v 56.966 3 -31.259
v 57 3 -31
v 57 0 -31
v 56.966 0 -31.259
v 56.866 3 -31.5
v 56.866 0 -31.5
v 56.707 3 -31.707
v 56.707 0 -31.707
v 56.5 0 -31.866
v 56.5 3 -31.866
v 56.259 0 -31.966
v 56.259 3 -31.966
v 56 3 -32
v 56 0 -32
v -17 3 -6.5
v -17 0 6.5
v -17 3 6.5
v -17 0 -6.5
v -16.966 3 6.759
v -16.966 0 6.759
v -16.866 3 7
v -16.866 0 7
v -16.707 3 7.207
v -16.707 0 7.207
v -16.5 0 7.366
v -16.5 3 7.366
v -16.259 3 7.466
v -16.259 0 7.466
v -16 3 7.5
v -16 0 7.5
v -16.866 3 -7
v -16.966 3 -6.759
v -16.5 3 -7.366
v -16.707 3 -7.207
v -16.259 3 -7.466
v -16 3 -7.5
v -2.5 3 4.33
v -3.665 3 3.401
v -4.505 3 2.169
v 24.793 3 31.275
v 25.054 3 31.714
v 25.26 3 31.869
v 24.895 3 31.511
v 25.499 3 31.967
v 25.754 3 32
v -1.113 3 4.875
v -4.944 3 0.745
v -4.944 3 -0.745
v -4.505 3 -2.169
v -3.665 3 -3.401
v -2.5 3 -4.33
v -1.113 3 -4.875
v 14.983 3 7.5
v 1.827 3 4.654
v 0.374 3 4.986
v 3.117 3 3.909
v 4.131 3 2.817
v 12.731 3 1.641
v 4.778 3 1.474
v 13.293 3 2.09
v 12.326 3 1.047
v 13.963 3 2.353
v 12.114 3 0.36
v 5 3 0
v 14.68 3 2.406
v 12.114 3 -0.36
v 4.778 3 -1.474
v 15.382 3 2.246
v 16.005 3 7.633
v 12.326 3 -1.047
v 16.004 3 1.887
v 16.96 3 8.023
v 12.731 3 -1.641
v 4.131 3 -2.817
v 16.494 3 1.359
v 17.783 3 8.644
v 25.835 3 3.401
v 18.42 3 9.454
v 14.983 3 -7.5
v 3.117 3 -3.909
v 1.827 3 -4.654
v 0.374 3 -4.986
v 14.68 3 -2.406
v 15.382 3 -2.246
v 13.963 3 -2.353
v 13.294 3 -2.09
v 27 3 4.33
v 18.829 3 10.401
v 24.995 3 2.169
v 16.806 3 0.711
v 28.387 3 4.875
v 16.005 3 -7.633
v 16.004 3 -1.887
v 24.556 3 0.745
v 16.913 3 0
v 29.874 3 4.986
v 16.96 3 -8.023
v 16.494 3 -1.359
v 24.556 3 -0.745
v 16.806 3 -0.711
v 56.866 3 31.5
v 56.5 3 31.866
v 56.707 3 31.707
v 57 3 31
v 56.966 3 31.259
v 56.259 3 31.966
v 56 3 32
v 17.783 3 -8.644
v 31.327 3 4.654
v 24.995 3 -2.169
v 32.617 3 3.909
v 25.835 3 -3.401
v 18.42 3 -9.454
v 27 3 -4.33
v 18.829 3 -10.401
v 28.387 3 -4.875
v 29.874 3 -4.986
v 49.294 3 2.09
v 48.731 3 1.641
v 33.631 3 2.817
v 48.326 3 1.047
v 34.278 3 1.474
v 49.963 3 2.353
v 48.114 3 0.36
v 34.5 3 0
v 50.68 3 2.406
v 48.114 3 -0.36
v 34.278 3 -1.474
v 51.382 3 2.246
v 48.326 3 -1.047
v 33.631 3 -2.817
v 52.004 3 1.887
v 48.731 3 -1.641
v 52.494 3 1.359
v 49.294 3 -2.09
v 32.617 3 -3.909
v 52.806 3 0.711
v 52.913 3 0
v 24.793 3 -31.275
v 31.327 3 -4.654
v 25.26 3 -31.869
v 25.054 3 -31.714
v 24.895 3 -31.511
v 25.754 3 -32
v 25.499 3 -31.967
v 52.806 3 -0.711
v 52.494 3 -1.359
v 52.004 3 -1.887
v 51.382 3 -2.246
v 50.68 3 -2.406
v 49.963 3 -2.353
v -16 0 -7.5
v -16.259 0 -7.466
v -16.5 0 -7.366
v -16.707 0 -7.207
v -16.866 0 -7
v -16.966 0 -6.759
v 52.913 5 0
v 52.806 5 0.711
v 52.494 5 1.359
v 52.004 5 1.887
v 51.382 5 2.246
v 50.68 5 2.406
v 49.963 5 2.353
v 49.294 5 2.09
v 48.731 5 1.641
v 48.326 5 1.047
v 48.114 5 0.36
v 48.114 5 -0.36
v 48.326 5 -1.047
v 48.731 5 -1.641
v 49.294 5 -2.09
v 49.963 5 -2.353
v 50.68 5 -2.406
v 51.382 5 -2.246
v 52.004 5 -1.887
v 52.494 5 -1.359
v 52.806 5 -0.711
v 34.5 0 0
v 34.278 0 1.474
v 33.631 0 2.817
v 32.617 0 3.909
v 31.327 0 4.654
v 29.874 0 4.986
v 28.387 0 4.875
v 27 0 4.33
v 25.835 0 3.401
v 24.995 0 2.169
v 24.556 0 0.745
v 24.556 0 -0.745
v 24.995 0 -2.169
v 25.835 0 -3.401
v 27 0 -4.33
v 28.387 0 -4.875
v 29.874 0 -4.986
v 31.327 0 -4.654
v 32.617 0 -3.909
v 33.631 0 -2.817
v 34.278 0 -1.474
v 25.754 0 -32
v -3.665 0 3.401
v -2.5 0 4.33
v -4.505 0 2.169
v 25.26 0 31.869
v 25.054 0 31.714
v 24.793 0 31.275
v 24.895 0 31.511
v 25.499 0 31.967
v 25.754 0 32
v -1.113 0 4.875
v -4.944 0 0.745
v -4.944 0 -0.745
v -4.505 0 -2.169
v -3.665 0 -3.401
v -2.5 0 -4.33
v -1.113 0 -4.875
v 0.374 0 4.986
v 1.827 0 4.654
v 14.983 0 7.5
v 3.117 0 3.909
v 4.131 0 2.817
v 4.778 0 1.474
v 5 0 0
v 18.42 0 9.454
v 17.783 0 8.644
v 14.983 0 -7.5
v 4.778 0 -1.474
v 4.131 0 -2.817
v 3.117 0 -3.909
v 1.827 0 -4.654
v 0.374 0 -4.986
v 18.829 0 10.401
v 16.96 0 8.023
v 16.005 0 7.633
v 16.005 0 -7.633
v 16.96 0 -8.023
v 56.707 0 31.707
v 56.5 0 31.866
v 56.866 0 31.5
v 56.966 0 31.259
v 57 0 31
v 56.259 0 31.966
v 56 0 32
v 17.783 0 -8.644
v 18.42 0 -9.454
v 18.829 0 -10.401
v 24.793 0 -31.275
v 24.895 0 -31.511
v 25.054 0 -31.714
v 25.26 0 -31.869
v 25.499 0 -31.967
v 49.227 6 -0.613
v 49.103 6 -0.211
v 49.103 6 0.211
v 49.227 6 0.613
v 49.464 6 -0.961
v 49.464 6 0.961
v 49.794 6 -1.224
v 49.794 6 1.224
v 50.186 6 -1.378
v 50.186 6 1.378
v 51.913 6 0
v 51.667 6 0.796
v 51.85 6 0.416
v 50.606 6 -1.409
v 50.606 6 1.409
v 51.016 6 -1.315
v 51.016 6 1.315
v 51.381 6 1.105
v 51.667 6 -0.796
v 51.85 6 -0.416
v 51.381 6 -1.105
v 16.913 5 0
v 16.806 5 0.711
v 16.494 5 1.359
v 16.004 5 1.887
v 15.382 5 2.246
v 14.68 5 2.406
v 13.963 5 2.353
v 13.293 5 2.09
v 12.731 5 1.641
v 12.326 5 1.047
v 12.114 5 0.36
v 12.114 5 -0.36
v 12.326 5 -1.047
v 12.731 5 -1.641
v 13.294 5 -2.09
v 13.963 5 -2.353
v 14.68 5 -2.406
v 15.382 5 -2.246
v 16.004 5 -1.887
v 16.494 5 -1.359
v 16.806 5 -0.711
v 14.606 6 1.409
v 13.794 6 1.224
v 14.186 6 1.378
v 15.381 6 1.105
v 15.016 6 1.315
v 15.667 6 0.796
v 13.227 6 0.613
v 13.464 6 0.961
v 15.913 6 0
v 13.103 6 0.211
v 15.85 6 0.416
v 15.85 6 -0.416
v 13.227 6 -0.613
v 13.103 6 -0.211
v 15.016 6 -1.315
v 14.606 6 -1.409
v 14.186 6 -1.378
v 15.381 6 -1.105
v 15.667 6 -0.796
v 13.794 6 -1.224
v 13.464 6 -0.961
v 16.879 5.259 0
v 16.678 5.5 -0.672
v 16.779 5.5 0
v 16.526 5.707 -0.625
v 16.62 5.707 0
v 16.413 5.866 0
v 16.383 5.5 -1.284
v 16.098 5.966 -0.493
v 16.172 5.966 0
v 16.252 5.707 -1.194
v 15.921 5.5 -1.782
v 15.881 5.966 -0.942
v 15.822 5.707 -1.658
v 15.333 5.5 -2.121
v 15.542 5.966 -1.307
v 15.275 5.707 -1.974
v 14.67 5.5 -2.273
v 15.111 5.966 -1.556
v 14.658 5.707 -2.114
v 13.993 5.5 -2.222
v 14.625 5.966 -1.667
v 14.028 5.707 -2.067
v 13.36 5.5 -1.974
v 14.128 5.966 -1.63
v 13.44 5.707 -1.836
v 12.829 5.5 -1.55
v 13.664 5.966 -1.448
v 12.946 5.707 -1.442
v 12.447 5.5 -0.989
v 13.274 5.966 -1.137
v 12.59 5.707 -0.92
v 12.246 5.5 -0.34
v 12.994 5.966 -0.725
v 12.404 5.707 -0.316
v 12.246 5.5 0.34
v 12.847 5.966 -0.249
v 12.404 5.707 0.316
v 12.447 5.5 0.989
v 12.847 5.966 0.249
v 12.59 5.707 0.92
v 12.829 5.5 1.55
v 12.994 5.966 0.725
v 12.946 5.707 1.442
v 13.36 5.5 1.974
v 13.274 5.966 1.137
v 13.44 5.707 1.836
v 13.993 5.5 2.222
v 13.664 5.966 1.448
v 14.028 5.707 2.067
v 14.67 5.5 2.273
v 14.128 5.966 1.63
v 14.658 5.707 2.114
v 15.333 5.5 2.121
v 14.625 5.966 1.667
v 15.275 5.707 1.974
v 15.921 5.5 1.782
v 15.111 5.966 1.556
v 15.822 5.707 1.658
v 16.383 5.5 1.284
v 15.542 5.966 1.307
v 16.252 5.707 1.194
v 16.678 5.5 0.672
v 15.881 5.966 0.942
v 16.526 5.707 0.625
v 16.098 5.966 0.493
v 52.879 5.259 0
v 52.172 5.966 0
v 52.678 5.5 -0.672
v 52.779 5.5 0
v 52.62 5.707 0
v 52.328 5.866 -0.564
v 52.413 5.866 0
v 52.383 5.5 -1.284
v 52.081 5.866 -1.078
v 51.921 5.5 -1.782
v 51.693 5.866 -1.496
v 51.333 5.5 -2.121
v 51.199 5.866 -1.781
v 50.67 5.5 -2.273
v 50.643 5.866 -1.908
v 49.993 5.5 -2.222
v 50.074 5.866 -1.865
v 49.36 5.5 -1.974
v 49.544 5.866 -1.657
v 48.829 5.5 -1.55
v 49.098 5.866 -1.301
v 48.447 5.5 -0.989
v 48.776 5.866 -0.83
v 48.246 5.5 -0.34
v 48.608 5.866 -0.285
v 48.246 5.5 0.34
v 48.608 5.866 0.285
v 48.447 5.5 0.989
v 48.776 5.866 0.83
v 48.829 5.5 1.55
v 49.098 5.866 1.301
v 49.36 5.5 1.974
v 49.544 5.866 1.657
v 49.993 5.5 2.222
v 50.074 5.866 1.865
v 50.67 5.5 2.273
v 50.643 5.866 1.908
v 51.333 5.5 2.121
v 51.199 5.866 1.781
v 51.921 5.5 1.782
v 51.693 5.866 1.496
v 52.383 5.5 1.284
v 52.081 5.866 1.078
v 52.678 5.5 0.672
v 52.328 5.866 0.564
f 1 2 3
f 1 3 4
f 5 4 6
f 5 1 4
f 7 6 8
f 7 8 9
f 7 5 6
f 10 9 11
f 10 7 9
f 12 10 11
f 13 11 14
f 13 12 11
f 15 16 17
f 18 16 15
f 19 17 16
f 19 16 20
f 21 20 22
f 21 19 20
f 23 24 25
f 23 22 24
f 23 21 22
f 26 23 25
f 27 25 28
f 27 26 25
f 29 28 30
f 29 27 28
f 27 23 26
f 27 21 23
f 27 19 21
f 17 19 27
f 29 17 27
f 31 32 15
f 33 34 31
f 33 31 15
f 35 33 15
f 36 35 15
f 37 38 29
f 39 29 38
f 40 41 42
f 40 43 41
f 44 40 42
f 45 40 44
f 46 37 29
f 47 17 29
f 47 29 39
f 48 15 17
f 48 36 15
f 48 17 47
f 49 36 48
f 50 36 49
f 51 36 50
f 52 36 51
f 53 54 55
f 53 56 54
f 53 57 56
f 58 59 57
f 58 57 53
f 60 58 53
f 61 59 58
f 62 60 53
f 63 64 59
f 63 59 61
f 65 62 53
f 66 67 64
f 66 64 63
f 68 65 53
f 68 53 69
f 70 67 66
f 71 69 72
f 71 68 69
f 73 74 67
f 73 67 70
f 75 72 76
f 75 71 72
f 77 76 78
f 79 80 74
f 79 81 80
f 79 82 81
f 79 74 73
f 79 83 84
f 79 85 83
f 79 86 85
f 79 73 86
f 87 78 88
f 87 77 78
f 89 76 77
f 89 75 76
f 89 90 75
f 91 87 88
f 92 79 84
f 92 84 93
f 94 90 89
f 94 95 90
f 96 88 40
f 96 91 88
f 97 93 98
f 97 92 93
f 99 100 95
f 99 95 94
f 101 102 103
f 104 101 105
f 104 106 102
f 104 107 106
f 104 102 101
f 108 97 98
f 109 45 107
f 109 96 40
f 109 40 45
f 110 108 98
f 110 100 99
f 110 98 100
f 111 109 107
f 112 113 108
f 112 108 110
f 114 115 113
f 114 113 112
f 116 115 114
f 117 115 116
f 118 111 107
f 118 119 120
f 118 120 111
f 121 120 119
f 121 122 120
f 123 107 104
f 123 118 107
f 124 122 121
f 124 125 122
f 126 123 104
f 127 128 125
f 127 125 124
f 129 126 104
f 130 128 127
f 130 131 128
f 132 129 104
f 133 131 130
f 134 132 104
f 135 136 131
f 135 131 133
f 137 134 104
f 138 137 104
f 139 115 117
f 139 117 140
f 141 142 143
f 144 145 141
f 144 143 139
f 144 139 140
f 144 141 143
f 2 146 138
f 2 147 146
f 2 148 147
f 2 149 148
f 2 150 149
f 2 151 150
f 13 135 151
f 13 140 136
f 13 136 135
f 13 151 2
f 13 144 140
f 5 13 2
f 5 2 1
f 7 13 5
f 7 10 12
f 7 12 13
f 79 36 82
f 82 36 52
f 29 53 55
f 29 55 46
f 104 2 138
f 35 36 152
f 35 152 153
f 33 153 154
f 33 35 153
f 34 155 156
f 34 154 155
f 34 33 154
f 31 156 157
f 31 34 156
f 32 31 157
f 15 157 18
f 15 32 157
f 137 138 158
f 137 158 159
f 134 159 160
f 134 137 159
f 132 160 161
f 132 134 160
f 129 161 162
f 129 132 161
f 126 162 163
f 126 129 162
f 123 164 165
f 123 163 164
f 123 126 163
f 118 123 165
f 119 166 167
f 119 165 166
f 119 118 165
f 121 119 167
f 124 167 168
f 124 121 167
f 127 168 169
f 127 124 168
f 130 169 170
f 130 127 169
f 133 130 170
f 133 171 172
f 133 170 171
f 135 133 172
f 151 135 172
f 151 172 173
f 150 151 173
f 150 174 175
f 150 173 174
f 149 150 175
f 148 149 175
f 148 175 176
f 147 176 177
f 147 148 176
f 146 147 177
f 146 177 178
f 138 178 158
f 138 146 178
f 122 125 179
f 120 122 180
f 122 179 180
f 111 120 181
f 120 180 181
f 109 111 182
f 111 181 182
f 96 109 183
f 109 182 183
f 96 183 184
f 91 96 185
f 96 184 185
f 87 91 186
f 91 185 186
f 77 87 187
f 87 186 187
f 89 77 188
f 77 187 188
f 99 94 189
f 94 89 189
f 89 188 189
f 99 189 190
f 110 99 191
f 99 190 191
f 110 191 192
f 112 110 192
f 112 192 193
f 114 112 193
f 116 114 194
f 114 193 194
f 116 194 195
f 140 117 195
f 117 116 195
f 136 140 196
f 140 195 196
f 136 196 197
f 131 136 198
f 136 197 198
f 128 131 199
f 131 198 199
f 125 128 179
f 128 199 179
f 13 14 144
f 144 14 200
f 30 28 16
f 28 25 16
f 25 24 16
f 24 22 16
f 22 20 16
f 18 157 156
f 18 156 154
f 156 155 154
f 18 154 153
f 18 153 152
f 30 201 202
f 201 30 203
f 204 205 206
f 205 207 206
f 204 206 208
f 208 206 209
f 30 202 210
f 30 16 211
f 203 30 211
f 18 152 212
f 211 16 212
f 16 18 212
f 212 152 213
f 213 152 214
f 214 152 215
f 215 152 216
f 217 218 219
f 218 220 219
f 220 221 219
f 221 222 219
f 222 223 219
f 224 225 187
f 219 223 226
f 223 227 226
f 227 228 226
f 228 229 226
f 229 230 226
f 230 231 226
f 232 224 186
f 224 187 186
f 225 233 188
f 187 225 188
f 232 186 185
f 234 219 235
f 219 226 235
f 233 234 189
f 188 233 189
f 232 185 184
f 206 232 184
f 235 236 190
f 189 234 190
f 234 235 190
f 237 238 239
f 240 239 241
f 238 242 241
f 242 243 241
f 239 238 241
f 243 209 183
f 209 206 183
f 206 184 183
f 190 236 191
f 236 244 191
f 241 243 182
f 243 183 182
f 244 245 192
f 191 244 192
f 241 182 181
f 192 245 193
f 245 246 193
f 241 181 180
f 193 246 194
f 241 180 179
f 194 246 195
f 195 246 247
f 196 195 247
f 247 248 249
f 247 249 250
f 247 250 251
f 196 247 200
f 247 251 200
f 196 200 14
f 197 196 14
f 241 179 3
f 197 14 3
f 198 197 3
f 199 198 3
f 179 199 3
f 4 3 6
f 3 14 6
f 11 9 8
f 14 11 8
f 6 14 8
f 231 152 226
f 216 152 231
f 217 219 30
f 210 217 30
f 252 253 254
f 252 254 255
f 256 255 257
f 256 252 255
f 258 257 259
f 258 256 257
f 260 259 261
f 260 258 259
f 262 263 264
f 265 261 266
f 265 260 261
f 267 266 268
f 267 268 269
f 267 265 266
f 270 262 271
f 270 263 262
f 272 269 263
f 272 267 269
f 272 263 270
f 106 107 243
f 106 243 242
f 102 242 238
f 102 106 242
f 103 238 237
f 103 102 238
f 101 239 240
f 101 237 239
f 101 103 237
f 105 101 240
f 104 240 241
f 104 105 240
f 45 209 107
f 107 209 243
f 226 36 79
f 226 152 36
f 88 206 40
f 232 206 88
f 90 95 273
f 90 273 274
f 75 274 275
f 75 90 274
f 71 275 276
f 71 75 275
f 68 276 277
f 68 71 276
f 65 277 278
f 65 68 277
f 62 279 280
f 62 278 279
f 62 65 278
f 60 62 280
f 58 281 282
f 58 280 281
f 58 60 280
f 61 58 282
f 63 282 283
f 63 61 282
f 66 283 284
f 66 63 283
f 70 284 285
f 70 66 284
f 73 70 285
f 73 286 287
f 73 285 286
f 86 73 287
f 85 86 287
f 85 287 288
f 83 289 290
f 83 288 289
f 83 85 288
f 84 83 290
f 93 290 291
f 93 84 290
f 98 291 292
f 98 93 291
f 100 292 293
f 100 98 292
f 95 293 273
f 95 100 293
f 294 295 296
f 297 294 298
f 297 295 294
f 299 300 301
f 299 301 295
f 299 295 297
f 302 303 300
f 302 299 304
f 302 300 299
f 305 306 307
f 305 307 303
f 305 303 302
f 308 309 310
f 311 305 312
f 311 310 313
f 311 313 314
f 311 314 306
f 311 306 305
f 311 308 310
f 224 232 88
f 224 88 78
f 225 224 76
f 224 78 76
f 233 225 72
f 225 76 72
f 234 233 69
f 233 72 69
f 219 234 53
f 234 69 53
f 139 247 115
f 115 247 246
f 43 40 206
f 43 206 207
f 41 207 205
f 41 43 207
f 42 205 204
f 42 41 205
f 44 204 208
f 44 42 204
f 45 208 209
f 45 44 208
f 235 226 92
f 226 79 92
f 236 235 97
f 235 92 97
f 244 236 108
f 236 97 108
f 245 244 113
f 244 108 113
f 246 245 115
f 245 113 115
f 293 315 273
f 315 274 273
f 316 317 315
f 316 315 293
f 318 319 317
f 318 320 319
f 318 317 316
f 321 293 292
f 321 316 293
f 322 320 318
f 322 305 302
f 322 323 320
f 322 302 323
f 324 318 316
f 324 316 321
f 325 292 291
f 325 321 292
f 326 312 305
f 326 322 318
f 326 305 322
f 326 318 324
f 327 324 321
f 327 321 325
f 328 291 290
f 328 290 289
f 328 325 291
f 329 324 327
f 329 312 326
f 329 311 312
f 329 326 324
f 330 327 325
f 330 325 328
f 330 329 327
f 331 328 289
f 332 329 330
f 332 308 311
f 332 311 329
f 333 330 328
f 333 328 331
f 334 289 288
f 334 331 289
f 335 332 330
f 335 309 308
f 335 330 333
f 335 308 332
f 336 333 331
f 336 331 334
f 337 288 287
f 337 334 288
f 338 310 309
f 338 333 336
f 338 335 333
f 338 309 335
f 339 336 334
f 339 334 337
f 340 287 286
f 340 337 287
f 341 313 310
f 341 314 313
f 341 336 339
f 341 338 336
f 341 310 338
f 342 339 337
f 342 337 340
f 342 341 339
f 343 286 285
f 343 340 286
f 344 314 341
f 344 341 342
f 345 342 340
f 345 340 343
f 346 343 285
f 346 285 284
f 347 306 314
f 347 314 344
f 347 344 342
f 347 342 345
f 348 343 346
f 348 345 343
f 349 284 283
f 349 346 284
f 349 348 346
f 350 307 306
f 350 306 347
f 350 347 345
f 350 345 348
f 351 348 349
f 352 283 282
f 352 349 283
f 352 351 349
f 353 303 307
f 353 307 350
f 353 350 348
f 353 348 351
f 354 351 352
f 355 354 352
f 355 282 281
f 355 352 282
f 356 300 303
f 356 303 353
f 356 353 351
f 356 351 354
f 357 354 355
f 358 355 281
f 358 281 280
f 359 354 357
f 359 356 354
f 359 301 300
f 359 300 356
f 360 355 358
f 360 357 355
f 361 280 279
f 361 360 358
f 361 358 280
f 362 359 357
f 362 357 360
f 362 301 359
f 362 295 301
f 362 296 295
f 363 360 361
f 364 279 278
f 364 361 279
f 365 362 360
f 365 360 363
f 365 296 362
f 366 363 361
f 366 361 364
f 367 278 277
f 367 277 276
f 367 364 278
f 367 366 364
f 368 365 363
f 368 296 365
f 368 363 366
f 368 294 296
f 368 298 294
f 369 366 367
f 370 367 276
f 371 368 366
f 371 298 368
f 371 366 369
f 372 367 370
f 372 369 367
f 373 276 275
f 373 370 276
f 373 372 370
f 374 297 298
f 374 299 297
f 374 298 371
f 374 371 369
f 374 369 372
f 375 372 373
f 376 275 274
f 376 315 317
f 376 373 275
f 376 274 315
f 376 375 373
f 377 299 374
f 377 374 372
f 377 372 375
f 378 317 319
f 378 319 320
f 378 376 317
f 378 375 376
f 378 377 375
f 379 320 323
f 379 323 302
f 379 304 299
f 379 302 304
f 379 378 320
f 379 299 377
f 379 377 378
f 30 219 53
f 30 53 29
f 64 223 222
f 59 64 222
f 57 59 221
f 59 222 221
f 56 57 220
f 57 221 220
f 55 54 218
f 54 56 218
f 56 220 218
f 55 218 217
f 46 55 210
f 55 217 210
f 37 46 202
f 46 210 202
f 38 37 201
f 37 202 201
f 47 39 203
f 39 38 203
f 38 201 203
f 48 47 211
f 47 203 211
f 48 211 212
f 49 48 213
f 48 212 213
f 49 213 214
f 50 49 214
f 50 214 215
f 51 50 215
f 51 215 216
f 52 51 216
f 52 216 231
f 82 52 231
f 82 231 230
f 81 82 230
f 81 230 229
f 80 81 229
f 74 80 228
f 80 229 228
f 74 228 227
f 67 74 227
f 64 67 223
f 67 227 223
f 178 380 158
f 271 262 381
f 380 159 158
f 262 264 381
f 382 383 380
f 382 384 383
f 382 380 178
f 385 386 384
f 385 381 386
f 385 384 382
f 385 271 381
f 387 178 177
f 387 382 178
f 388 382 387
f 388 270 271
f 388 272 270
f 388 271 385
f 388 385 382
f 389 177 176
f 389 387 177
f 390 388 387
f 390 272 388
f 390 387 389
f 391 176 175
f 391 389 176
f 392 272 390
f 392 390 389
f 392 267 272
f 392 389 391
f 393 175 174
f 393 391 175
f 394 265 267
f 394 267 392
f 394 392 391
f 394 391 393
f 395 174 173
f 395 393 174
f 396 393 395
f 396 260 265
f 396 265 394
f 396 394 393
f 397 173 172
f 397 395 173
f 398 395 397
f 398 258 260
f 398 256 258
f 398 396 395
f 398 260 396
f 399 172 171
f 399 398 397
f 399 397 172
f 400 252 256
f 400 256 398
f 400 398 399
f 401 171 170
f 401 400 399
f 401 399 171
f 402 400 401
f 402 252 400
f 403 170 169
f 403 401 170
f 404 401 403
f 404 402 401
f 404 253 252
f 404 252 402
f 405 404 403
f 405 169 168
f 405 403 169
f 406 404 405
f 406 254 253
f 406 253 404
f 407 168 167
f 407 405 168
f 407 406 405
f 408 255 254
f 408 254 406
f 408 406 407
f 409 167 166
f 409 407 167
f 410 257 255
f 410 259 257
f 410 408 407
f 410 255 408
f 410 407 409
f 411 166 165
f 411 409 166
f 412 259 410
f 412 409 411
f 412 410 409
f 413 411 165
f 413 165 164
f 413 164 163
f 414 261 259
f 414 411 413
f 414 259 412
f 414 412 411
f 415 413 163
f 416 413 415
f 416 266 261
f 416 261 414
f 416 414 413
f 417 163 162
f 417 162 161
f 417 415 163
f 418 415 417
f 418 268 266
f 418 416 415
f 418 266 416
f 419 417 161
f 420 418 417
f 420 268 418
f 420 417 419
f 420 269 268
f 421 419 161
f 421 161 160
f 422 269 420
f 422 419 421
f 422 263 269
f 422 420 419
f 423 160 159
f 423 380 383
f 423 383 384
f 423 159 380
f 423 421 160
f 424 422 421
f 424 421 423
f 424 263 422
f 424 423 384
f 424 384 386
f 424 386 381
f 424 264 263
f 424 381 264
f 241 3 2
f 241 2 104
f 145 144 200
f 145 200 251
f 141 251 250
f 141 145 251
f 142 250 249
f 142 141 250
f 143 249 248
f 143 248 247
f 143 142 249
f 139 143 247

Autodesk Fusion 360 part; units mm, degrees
sketch "Top" plane through (0, 0, 0) normal (0, 1, 0) x (1, 0, 0)
  line L0 (-17, 0) -> (118, 0) construction
  circle A0 centre (0, 0) radius 5
  circle A1 centre (29.5, 0) radius 5
  line L1 (-17, 7.5) -> (57, 7.5)
  line L2 (57, 7.5) -> (57, -7.5)
  line L3 (57, -7.5) -> (-17, -7.5)
  line L4 (-17, -7.5) -> (-17, 7.5)
  line L5 (57, 32) -> (25, 32)
  line L6 (25, 32) -> (25, -32)
  line L7 (25, -32) -> (57, -32)
  line L8 (57, -32) -> (57, 32)
  line L9 (25, 32) -> (18, 7.5)
  line L10 (25, -32) -> (18, -7.5)
  circle A2 centre (14.5, 0) radius 2.413
  circle A3 centre (50.5, 0) radius 2.413
  point P0 (-17, 0)
  point P1 (57, 0)
  point P2 (57, 0)
  dimension "d1" = 10
  dimension "d2" = 10
  dimension "d3" = 29.5
  dimension "d4" = 74
  dimension "d5" = 15
  dimension "d6" = 17
  dimension "d7" = 64
  dimension "d8" = 18
  dimension "d9" = 32
  dimension "d16" = 4.826
  dimension "d17" = 14.5
  dimension "d18" = 4.826
  dimension "d19" = 50.5
extrude "Extrude1" add sketch "Top" along normal blind 3 contours A1 L1 L2 L3 L6 L8 | A1 L1 L3 L4 L6 | L1 L5 L6 L8 | L1 L6 L9 | L3 L6 L10 | L3 L6 L7 L8 | A2 | A3
fillet "Fillet1" radius 1 6 edges at (-17, 1.5, 7.5) (-17, 1.5, -7.5) (57, 1.5, 32) (57, 1.5, -32) (25, 1.5, -32) (25, 1.5, 32)
fillet "Fillet2" radius 4 2 edges at (18, 1.5, -7.5) (18, 1.5, 7.5)
extrude "Extrude2" add sketch "Top" along normal blind 3 from surface at 3 contours A2 | A3
fillet "Fillet3" radius 1 2 edges at (12.2503, 6, 0.8726) (48.2503, 6, 0.8726)
